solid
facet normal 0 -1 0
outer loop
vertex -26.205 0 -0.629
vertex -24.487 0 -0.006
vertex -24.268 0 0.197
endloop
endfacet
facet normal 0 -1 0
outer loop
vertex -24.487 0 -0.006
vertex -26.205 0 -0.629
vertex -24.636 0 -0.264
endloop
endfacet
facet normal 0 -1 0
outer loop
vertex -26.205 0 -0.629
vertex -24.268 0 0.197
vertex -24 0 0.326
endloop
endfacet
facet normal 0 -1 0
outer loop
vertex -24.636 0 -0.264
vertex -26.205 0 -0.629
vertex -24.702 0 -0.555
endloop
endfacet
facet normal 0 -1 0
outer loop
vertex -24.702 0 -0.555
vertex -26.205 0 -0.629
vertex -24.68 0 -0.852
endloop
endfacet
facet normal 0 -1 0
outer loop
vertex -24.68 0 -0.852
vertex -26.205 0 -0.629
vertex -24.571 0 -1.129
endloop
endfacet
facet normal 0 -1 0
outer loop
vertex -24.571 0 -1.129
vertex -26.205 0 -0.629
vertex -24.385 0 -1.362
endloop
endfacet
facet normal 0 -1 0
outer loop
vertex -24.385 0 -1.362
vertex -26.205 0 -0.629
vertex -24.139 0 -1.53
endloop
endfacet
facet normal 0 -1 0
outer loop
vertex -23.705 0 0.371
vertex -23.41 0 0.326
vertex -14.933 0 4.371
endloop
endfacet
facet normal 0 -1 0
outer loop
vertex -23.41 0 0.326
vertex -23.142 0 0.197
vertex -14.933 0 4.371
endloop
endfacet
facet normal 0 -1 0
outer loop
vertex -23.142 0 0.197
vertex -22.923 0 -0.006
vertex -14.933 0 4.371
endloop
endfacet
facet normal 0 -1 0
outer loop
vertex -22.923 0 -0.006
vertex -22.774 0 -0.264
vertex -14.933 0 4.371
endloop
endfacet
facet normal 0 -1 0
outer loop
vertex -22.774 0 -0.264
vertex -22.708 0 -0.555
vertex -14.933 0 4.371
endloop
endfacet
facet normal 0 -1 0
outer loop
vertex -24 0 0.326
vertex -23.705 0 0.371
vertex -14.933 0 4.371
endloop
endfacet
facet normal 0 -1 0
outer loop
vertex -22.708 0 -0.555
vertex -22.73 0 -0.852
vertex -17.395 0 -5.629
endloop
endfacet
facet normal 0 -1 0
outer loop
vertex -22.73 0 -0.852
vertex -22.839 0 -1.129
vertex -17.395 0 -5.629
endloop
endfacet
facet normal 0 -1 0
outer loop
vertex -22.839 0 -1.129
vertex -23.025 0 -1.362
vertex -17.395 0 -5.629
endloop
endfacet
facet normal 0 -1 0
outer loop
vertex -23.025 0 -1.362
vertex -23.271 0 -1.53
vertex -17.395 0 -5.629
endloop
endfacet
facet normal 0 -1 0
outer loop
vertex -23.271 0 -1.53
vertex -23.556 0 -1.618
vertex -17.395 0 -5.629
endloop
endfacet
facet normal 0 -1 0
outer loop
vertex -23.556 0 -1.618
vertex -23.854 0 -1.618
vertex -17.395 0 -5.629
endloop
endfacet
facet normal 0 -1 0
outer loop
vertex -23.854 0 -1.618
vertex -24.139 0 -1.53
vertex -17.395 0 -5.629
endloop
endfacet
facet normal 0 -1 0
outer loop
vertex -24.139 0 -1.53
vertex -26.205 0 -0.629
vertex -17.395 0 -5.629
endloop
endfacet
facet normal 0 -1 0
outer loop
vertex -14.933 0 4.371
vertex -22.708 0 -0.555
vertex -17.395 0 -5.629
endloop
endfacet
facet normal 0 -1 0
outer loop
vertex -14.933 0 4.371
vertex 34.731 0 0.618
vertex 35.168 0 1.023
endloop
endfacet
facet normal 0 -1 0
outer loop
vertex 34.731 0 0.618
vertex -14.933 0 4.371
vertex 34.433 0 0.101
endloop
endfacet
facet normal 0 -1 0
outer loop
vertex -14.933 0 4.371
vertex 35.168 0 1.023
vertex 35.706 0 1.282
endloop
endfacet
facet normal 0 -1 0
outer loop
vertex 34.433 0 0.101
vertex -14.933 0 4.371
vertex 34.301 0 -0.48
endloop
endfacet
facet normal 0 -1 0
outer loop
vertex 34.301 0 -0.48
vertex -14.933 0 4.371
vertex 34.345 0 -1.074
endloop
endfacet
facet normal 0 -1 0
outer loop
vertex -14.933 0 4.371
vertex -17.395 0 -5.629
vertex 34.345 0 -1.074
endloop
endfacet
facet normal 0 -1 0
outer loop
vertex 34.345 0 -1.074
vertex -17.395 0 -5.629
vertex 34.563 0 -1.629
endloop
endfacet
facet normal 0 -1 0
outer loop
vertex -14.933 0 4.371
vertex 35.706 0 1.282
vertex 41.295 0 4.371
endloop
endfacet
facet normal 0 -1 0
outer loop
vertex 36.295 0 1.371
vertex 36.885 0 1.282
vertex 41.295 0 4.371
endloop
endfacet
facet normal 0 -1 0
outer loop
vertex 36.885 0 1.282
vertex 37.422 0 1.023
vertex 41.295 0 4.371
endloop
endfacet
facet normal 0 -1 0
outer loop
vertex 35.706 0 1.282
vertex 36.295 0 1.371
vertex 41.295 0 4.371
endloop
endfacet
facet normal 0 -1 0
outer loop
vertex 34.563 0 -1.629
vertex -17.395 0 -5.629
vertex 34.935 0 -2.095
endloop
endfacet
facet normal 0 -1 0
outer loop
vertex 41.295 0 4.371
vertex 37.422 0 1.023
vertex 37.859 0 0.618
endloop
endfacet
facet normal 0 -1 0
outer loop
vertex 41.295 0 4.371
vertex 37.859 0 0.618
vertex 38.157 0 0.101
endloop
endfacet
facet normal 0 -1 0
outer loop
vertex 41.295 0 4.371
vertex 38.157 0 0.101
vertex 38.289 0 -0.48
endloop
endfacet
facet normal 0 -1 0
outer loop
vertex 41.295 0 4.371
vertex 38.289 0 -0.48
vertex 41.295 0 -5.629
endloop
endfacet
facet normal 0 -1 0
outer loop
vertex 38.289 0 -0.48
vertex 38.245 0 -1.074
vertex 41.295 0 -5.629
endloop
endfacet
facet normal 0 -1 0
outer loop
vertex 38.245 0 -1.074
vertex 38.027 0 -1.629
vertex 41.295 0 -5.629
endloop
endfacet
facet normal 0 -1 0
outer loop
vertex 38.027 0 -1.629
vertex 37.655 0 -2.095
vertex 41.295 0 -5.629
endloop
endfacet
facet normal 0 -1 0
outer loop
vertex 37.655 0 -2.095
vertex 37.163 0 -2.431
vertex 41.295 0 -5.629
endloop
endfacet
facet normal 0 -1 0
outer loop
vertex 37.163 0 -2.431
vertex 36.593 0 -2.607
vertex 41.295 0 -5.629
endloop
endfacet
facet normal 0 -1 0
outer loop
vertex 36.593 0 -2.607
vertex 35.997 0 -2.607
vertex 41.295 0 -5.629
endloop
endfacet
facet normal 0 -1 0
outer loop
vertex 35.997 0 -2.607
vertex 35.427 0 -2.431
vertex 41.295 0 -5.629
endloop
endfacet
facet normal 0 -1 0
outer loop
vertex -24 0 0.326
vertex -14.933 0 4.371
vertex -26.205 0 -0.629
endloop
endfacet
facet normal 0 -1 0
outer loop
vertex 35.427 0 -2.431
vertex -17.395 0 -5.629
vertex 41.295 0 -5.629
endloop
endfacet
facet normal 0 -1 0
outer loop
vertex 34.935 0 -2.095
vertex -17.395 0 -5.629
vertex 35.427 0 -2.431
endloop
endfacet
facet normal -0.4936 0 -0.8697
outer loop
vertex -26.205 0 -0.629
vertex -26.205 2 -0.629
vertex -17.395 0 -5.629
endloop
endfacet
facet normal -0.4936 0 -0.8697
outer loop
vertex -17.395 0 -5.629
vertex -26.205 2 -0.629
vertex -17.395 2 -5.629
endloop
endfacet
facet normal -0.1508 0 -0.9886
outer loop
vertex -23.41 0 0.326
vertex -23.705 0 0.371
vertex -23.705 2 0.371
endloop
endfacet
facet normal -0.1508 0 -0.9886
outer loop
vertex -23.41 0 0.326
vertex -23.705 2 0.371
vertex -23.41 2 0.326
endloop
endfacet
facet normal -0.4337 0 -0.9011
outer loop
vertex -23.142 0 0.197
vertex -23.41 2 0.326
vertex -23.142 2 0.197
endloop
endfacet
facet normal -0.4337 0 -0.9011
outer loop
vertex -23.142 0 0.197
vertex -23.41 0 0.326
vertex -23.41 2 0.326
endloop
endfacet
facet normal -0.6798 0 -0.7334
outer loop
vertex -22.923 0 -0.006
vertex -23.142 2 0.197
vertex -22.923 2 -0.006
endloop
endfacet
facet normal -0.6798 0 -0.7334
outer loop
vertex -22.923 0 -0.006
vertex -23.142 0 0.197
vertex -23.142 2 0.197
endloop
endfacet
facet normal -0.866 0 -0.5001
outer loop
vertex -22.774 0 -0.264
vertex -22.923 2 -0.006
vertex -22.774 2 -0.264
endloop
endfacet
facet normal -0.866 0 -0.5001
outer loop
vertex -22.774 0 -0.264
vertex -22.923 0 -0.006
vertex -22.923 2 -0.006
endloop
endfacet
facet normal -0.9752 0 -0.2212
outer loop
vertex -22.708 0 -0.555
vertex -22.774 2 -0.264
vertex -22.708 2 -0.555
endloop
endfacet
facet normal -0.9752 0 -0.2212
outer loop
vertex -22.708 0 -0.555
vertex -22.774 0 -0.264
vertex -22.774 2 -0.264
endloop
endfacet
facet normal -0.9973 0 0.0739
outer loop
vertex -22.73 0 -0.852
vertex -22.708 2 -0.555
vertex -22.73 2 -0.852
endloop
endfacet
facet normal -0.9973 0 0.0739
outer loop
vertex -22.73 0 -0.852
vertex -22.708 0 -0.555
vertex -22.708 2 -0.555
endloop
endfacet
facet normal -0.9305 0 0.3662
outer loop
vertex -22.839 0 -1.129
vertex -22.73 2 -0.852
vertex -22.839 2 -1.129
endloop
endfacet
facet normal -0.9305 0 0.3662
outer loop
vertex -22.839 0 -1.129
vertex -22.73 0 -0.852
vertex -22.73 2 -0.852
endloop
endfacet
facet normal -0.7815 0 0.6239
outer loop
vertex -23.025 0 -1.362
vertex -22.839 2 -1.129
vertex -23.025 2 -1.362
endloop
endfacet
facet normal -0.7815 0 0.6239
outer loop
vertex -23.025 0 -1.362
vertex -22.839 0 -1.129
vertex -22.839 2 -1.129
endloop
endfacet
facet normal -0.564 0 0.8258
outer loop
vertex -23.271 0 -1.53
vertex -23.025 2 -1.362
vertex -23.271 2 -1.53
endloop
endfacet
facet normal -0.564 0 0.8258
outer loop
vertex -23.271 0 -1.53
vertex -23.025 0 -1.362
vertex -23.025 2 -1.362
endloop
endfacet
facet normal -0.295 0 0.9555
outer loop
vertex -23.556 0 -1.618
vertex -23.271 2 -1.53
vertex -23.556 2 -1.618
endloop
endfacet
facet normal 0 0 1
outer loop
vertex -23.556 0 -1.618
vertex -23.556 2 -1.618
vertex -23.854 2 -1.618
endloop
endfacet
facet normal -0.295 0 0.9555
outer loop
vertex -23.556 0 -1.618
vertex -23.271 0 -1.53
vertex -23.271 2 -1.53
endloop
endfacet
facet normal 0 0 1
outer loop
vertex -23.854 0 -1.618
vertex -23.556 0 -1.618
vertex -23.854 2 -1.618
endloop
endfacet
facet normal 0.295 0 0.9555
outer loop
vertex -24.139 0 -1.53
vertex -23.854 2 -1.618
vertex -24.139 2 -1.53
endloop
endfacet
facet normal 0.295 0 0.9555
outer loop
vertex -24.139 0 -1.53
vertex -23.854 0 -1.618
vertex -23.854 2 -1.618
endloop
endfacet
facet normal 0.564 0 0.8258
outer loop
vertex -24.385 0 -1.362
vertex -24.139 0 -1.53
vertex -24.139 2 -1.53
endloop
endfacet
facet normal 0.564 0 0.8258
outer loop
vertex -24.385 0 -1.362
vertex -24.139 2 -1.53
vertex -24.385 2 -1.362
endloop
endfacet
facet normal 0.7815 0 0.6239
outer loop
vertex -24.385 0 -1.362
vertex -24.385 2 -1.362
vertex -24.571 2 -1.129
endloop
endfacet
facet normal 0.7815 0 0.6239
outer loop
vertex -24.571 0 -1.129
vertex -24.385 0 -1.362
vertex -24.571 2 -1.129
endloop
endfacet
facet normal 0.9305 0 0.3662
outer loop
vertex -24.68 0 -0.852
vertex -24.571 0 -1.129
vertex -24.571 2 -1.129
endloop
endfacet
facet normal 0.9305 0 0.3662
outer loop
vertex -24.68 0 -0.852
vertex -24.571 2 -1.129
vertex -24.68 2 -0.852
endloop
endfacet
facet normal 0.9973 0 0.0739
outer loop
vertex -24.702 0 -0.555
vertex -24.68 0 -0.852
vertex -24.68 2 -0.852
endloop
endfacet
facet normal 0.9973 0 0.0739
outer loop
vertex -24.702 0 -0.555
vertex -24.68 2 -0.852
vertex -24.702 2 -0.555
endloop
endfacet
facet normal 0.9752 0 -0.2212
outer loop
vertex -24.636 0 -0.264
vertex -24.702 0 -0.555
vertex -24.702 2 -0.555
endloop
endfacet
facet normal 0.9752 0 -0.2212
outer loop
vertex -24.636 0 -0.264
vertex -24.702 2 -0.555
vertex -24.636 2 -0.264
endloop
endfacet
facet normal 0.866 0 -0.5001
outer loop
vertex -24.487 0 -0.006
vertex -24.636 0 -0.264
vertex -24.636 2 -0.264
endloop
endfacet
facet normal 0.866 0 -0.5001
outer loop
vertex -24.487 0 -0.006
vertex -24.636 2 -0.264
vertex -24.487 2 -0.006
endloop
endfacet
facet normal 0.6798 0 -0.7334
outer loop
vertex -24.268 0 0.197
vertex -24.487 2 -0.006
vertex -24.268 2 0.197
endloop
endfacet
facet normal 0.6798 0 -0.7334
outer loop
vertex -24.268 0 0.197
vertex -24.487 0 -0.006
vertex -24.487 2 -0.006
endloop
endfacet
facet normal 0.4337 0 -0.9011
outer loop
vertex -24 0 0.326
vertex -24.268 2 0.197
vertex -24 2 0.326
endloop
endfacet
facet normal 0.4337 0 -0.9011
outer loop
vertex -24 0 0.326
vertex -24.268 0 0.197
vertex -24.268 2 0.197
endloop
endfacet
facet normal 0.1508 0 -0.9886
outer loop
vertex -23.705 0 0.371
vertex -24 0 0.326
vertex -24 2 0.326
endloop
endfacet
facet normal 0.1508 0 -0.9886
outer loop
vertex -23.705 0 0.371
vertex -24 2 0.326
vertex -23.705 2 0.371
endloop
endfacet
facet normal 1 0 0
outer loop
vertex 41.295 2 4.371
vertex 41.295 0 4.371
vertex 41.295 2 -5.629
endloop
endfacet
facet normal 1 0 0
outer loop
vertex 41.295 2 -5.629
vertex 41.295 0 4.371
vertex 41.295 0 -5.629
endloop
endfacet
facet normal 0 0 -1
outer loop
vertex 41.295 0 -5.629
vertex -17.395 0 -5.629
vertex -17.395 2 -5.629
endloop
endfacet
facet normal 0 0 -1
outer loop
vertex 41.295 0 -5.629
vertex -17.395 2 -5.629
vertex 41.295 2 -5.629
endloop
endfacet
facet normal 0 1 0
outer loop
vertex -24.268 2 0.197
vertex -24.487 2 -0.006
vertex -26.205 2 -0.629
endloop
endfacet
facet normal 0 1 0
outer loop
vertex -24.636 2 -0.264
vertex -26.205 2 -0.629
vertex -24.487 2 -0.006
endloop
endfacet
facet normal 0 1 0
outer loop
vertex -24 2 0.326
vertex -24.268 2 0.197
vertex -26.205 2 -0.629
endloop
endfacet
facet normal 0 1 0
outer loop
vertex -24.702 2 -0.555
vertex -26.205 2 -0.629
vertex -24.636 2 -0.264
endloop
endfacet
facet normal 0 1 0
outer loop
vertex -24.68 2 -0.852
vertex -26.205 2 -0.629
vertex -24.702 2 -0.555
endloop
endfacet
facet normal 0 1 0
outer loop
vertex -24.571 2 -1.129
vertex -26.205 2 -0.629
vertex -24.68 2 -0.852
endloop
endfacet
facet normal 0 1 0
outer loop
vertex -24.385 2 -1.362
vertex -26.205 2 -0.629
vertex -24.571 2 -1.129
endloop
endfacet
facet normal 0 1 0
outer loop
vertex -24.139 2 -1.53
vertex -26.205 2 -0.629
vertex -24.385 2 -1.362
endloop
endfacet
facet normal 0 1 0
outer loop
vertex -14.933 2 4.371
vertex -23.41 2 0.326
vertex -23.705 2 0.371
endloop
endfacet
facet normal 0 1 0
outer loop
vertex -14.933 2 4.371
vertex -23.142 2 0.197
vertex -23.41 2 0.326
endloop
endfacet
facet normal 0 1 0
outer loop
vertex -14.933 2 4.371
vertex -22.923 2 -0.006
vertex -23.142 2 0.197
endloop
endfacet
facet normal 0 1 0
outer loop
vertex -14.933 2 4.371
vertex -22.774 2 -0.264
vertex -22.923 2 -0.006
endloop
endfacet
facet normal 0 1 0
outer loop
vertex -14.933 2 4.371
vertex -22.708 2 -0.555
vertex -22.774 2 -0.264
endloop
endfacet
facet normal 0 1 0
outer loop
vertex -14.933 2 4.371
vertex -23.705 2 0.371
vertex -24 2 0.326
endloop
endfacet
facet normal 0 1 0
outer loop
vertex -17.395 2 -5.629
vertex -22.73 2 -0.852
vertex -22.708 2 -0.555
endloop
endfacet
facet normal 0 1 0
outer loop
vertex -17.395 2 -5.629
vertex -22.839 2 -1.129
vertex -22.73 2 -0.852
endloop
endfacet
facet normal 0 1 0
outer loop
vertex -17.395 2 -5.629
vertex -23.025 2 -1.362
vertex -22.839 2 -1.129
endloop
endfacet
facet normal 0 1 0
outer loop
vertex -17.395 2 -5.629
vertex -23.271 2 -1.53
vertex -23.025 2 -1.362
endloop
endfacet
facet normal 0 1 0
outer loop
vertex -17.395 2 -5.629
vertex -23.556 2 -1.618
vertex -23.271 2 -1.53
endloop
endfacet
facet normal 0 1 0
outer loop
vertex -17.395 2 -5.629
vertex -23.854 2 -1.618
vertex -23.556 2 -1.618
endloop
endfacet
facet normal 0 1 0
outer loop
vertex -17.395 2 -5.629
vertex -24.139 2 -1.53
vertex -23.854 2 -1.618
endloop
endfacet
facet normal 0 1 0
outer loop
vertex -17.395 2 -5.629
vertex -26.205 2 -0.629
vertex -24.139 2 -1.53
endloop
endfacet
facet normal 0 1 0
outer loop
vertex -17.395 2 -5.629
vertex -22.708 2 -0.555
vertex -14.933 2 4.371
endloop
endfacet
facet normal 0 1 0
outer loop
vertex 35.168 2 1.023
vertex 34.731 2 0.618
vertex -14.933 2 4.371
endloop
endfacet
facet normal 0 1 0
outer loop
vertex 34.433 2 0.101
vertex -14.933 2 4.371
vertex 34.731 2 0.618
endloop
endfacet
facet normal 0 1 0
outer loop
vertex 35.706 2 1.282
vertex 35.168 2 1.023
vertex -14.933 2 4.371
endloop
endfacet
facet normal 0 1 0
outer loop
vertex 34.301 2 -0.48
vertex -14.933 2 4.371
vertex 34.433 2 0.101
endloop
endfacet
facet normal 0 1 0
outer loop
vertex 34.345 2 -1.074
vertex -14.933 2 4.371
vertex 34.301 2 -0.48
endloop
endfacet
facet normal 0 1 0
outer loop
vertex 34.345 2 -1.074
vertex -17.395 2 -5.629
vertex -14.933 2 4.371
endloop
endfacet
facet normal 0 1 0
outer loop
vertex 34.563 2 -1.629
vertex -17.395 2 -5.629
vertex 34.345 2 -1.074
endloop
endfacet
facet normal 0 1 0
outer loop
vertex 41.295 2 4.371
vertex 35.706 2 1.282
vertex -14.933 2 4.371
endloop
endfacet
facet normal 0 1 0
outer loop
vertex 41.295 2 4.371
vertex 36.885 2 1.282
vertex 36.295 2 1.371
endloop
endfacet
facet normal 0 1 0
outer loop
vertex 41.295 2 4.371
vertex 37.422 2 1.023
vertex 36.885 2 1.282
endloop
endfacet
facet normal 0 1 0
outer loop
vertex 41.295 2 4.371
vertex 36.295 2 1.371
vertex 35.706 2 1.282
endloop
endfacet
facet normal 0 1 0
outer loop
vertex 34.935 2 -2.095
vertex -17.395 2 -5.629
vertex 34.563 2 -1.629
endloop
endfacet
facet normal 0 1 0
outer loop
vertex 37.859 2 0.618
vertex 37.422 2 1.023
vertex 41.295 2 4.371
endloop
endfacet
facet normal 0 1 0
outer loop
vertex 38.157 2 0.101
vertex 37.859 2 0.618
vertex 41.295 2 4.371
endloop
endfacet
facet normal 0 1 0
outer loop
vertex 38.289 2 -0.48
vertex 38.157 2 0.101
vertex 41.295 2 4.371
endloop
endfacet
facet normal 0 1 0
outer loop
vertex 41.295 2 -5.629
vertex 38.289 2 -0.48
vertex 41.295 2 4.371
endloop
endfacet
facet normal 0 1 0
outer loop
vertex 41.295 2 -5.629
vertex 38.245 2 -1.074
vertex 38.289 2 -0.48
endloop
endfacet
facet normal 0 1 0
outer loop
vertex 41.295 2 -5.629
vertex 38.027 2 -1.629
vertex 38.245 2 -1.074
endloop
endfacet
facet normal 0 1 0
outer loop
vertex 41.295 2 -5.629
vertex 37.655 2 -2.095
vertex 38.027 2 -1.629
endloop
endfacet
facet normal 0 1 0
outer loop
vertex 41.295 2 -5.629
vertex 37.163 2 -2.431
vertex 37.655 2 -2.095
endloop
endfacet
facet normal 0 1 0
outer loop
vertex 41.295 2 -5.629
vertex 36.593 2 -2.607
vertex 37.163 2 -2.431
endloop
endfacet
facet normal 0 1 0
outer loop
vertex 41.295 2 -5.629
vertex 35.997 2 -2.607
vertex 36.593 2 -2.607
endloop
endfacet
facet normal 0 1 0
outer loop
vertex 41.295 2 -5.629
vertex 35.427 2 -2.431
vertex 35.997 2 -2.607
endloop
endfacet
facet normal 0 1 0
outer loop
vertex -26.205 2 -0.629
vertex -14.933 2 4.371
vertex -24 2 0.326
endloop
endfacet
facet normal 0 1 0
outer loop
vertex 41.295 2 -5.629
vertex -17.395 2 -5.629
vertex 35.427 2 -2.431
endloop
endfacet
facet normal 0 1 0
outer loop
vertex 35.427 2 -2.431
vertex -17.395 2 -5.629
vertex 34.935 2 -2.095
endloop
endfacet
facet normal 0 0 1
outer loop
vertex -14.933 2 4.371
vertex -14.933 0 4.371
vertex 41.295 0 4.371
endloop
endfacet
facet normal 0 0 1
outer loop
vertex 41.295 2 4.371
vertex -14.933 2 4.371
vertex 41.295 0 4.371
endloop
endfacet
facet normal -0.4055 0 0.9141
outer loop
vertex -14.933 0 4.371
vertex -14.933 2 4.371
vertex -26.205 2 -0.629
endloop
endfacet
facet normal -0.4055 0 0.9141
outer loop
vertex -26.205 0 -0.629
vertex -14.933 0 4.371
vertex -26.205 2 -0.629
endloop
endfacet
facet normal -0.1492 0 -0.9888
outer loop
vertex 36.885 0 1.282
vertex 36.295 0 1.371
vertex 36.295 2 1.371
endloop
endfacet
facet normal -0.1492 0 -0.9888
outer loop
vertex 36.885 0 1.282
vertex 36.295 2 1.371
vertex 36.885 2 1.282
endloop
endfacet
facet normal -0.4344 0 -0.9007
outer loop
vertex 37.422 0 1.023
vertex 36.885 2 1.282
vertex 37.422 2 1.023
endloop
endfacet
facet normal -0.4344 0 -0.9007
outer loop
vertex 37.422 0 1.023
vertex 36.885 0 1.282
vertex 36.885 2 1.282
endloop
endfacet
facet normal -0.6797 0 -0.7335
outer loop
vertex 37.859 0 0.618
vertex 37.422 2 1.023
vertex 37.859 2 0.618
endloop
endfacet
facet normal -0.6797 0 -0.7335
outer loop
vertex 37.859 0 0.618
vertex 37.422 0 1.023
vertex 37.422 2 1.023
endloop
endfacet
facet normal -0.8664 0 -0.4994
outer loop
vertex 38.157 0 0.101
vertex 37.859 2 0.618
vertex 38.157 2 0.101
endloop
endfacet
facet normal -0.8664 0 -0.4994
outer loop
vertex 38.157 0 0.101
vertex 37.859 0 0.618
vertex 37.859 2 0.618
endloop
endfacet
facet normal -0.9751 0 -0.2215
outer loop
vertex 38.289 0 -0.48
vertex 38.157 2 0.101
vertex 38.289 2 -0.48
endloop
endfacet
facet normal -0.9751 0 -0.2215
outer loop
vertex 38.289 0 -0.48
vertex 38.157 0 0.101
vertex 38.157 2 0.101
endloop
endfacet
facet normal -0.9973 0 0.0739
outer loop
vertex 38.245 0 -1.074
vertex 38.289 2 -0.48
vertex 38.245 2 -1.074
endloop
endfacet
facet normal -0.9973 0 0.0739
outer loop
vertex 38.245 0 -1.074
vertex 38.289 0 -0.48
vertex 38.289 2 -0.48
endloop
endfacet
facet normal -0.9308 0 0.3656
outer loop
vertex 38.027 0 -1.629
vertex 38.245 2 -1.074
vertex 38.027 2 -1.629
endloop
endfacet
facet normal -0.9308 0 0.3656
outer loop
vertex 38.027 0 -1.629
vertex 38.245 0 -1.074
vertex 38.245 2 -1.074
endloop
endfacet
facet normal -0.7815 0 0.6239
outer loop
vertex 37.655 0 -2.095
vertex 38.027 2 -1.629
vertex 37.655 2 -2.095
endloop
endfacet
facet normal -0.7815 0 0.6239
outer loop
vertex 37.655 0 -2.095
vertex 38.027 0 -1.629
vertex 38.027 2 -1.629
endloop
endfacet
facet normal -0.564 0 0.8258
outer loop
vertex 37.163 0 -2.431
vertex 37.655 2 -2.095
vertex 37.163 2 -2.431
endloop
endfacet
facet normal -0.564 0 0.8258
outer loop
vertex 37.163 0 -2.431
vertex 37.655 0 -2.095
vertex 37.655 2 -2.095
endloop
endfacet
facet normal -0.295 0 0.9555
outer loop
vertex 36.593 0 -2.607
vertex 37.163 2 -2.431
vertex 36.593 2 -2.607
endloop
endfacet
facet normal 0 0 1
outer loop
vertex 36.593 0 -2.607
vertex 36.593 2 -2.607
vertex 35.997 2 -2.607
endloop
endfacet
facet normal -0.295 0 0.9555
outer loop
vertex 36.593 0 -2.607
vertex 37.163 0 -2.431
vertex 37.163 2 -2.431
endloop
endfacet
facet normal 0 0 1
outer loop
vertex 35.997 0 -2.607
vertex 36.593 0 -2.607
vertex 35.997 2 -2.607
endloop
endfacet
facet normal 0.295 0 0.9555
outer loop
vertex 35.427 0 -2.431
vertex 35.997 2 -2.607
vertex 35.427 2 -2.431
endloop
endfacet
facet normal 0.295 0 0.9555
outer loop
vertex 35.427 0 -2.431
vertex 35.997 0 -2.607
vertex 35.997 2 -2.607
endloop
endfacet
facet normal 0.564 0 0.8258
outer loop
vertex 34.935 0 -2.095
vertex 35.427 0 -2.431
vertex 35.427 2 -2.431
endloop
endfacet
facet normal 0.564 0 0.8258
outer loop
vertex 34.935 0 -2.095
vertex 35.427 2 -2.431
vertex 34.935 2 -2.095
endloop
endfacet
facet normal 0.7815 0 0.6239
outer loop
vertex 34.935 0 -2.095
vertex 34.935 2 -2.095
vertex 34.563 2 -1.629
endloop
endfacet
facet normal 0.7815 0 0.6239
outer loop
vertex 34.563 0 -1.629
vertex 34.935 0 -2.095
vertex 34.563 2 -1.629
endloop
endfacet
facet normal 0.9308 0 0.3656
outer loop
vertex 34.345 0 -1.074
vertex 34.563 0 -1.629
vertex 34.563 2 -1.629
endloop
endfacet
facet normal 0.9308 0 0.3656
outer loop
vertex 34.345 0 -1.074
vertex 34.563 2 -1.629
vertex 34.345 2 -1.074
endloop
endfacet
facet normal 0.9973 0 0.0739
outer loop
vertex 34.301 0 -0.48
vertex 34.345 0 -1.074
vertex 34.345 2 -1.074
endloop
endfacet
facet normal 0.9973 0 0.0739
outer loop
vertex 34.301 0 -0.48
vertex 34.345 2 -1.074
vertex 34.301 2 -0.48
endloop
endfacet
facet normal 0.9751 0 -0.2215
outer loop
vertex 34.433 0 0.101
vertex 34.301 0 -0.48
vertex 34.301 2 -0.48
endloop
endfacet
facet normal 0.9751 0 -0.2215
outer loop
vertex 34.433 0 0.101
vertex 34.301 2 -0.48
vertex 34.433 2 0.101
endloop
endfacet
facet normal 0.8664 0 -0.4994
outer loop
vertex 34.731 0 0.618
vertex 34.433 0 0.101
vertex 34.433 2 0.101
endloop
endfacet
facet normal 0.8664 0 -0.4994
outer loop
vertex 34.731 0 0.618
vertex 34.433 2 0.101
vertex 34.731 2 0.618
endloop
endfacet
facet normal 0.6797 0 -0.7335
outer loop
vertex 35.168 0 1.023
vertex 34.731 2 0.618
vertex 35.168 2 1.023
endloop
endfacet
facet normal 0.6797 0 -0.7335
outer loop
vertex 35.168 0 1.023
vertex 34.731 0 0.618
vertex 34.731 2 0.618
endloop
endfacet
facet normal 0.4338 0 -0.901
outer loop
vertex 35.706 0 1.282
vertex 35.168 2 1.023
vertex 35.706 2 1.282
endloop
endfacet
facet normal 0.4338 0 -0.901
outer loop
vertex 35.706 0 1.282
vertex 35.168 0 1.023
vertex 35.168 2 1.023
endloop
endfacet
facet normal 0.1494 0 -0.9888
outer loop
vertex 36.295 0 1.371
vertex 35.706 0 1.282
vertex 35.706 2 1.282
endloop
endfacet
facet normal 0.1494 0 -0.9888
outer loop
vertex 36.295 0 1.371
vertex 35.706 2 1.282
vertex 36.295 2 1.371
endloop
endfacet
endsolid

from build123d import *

# Parameters (mm, degrees)
SKETCH1_W           = 67.5
SKETCH1_H           = 10
SKETCH1_R           = 1
SKETCH1_R_2         = 2
BOSS_EXTRUDE1_DEPTH = 2
FILLET2_R           = 5
FILLET3_R           = 5
CUT_EXTRUDE1_DEPTH  = 10


with BuildPart() as part:
    # Sketch1 → Boss-Extrude1 (new body)
    with BuildSketch(Plane(origin=(0, 0, 0), x_dir=(1, 0, 0), z_dir=(0, 1, 0))):
        with Locations((7.54504806, 0.629386767)):
            Rectangle(SKETCH1_W, SKETCH1_H)
        with Locations(Location((-23.70495194, 0.629386767, 0), (0, 0, 270))):
            Circle(SKETCH1_R, mode=Mode.SUBTRACT)
        with Locations(Location((36.29504806, 0.629386767, 0), (0, 0, 270))):
            Circle(SKETCH1_R_2, mode=Mode.SUBTRACT)
    extrude(amount=BOSS_EXTRUDE1_DEPTH)

    # Fillet2
    fillet2_edges = [part.edges().sort_by_distance(p)[0] for p in [
        (-26.20495194, 1, -5.629386767),
    ]]
    fillet(fillet2_edges, radius=FILLET2_R)

    # Fillet3
    fillet3_edges = [part.edges().sort_by_distance(p)[0] for p in [
        (-26.20495194, 1, 4.370613233),
    ]]
    fillet(fillet3_edges, radius=FILLET3_R - 0.0001)  # a hair under: the kernel refuses the full size

    # Sketch2 → Cut-Extrude1 (cut)
    with BuildSketch(Plane(origin=(0, 2, 0), x_dir=(1, 0, 0), z_dir=(0, 1, 0))):
        Polygon((-26.20495194, 0.629386767), (-17.3953026, 5.629386767), (-30.276307772, 5.629386767), (-27.957364893, -6.288007195), (-14.932537807, -4.370613233), align=None)
    extrude(amount=-CUT_EXTRUDE1_DEPTH, mode=Mode.SUBTRACT)


solid = part.part
